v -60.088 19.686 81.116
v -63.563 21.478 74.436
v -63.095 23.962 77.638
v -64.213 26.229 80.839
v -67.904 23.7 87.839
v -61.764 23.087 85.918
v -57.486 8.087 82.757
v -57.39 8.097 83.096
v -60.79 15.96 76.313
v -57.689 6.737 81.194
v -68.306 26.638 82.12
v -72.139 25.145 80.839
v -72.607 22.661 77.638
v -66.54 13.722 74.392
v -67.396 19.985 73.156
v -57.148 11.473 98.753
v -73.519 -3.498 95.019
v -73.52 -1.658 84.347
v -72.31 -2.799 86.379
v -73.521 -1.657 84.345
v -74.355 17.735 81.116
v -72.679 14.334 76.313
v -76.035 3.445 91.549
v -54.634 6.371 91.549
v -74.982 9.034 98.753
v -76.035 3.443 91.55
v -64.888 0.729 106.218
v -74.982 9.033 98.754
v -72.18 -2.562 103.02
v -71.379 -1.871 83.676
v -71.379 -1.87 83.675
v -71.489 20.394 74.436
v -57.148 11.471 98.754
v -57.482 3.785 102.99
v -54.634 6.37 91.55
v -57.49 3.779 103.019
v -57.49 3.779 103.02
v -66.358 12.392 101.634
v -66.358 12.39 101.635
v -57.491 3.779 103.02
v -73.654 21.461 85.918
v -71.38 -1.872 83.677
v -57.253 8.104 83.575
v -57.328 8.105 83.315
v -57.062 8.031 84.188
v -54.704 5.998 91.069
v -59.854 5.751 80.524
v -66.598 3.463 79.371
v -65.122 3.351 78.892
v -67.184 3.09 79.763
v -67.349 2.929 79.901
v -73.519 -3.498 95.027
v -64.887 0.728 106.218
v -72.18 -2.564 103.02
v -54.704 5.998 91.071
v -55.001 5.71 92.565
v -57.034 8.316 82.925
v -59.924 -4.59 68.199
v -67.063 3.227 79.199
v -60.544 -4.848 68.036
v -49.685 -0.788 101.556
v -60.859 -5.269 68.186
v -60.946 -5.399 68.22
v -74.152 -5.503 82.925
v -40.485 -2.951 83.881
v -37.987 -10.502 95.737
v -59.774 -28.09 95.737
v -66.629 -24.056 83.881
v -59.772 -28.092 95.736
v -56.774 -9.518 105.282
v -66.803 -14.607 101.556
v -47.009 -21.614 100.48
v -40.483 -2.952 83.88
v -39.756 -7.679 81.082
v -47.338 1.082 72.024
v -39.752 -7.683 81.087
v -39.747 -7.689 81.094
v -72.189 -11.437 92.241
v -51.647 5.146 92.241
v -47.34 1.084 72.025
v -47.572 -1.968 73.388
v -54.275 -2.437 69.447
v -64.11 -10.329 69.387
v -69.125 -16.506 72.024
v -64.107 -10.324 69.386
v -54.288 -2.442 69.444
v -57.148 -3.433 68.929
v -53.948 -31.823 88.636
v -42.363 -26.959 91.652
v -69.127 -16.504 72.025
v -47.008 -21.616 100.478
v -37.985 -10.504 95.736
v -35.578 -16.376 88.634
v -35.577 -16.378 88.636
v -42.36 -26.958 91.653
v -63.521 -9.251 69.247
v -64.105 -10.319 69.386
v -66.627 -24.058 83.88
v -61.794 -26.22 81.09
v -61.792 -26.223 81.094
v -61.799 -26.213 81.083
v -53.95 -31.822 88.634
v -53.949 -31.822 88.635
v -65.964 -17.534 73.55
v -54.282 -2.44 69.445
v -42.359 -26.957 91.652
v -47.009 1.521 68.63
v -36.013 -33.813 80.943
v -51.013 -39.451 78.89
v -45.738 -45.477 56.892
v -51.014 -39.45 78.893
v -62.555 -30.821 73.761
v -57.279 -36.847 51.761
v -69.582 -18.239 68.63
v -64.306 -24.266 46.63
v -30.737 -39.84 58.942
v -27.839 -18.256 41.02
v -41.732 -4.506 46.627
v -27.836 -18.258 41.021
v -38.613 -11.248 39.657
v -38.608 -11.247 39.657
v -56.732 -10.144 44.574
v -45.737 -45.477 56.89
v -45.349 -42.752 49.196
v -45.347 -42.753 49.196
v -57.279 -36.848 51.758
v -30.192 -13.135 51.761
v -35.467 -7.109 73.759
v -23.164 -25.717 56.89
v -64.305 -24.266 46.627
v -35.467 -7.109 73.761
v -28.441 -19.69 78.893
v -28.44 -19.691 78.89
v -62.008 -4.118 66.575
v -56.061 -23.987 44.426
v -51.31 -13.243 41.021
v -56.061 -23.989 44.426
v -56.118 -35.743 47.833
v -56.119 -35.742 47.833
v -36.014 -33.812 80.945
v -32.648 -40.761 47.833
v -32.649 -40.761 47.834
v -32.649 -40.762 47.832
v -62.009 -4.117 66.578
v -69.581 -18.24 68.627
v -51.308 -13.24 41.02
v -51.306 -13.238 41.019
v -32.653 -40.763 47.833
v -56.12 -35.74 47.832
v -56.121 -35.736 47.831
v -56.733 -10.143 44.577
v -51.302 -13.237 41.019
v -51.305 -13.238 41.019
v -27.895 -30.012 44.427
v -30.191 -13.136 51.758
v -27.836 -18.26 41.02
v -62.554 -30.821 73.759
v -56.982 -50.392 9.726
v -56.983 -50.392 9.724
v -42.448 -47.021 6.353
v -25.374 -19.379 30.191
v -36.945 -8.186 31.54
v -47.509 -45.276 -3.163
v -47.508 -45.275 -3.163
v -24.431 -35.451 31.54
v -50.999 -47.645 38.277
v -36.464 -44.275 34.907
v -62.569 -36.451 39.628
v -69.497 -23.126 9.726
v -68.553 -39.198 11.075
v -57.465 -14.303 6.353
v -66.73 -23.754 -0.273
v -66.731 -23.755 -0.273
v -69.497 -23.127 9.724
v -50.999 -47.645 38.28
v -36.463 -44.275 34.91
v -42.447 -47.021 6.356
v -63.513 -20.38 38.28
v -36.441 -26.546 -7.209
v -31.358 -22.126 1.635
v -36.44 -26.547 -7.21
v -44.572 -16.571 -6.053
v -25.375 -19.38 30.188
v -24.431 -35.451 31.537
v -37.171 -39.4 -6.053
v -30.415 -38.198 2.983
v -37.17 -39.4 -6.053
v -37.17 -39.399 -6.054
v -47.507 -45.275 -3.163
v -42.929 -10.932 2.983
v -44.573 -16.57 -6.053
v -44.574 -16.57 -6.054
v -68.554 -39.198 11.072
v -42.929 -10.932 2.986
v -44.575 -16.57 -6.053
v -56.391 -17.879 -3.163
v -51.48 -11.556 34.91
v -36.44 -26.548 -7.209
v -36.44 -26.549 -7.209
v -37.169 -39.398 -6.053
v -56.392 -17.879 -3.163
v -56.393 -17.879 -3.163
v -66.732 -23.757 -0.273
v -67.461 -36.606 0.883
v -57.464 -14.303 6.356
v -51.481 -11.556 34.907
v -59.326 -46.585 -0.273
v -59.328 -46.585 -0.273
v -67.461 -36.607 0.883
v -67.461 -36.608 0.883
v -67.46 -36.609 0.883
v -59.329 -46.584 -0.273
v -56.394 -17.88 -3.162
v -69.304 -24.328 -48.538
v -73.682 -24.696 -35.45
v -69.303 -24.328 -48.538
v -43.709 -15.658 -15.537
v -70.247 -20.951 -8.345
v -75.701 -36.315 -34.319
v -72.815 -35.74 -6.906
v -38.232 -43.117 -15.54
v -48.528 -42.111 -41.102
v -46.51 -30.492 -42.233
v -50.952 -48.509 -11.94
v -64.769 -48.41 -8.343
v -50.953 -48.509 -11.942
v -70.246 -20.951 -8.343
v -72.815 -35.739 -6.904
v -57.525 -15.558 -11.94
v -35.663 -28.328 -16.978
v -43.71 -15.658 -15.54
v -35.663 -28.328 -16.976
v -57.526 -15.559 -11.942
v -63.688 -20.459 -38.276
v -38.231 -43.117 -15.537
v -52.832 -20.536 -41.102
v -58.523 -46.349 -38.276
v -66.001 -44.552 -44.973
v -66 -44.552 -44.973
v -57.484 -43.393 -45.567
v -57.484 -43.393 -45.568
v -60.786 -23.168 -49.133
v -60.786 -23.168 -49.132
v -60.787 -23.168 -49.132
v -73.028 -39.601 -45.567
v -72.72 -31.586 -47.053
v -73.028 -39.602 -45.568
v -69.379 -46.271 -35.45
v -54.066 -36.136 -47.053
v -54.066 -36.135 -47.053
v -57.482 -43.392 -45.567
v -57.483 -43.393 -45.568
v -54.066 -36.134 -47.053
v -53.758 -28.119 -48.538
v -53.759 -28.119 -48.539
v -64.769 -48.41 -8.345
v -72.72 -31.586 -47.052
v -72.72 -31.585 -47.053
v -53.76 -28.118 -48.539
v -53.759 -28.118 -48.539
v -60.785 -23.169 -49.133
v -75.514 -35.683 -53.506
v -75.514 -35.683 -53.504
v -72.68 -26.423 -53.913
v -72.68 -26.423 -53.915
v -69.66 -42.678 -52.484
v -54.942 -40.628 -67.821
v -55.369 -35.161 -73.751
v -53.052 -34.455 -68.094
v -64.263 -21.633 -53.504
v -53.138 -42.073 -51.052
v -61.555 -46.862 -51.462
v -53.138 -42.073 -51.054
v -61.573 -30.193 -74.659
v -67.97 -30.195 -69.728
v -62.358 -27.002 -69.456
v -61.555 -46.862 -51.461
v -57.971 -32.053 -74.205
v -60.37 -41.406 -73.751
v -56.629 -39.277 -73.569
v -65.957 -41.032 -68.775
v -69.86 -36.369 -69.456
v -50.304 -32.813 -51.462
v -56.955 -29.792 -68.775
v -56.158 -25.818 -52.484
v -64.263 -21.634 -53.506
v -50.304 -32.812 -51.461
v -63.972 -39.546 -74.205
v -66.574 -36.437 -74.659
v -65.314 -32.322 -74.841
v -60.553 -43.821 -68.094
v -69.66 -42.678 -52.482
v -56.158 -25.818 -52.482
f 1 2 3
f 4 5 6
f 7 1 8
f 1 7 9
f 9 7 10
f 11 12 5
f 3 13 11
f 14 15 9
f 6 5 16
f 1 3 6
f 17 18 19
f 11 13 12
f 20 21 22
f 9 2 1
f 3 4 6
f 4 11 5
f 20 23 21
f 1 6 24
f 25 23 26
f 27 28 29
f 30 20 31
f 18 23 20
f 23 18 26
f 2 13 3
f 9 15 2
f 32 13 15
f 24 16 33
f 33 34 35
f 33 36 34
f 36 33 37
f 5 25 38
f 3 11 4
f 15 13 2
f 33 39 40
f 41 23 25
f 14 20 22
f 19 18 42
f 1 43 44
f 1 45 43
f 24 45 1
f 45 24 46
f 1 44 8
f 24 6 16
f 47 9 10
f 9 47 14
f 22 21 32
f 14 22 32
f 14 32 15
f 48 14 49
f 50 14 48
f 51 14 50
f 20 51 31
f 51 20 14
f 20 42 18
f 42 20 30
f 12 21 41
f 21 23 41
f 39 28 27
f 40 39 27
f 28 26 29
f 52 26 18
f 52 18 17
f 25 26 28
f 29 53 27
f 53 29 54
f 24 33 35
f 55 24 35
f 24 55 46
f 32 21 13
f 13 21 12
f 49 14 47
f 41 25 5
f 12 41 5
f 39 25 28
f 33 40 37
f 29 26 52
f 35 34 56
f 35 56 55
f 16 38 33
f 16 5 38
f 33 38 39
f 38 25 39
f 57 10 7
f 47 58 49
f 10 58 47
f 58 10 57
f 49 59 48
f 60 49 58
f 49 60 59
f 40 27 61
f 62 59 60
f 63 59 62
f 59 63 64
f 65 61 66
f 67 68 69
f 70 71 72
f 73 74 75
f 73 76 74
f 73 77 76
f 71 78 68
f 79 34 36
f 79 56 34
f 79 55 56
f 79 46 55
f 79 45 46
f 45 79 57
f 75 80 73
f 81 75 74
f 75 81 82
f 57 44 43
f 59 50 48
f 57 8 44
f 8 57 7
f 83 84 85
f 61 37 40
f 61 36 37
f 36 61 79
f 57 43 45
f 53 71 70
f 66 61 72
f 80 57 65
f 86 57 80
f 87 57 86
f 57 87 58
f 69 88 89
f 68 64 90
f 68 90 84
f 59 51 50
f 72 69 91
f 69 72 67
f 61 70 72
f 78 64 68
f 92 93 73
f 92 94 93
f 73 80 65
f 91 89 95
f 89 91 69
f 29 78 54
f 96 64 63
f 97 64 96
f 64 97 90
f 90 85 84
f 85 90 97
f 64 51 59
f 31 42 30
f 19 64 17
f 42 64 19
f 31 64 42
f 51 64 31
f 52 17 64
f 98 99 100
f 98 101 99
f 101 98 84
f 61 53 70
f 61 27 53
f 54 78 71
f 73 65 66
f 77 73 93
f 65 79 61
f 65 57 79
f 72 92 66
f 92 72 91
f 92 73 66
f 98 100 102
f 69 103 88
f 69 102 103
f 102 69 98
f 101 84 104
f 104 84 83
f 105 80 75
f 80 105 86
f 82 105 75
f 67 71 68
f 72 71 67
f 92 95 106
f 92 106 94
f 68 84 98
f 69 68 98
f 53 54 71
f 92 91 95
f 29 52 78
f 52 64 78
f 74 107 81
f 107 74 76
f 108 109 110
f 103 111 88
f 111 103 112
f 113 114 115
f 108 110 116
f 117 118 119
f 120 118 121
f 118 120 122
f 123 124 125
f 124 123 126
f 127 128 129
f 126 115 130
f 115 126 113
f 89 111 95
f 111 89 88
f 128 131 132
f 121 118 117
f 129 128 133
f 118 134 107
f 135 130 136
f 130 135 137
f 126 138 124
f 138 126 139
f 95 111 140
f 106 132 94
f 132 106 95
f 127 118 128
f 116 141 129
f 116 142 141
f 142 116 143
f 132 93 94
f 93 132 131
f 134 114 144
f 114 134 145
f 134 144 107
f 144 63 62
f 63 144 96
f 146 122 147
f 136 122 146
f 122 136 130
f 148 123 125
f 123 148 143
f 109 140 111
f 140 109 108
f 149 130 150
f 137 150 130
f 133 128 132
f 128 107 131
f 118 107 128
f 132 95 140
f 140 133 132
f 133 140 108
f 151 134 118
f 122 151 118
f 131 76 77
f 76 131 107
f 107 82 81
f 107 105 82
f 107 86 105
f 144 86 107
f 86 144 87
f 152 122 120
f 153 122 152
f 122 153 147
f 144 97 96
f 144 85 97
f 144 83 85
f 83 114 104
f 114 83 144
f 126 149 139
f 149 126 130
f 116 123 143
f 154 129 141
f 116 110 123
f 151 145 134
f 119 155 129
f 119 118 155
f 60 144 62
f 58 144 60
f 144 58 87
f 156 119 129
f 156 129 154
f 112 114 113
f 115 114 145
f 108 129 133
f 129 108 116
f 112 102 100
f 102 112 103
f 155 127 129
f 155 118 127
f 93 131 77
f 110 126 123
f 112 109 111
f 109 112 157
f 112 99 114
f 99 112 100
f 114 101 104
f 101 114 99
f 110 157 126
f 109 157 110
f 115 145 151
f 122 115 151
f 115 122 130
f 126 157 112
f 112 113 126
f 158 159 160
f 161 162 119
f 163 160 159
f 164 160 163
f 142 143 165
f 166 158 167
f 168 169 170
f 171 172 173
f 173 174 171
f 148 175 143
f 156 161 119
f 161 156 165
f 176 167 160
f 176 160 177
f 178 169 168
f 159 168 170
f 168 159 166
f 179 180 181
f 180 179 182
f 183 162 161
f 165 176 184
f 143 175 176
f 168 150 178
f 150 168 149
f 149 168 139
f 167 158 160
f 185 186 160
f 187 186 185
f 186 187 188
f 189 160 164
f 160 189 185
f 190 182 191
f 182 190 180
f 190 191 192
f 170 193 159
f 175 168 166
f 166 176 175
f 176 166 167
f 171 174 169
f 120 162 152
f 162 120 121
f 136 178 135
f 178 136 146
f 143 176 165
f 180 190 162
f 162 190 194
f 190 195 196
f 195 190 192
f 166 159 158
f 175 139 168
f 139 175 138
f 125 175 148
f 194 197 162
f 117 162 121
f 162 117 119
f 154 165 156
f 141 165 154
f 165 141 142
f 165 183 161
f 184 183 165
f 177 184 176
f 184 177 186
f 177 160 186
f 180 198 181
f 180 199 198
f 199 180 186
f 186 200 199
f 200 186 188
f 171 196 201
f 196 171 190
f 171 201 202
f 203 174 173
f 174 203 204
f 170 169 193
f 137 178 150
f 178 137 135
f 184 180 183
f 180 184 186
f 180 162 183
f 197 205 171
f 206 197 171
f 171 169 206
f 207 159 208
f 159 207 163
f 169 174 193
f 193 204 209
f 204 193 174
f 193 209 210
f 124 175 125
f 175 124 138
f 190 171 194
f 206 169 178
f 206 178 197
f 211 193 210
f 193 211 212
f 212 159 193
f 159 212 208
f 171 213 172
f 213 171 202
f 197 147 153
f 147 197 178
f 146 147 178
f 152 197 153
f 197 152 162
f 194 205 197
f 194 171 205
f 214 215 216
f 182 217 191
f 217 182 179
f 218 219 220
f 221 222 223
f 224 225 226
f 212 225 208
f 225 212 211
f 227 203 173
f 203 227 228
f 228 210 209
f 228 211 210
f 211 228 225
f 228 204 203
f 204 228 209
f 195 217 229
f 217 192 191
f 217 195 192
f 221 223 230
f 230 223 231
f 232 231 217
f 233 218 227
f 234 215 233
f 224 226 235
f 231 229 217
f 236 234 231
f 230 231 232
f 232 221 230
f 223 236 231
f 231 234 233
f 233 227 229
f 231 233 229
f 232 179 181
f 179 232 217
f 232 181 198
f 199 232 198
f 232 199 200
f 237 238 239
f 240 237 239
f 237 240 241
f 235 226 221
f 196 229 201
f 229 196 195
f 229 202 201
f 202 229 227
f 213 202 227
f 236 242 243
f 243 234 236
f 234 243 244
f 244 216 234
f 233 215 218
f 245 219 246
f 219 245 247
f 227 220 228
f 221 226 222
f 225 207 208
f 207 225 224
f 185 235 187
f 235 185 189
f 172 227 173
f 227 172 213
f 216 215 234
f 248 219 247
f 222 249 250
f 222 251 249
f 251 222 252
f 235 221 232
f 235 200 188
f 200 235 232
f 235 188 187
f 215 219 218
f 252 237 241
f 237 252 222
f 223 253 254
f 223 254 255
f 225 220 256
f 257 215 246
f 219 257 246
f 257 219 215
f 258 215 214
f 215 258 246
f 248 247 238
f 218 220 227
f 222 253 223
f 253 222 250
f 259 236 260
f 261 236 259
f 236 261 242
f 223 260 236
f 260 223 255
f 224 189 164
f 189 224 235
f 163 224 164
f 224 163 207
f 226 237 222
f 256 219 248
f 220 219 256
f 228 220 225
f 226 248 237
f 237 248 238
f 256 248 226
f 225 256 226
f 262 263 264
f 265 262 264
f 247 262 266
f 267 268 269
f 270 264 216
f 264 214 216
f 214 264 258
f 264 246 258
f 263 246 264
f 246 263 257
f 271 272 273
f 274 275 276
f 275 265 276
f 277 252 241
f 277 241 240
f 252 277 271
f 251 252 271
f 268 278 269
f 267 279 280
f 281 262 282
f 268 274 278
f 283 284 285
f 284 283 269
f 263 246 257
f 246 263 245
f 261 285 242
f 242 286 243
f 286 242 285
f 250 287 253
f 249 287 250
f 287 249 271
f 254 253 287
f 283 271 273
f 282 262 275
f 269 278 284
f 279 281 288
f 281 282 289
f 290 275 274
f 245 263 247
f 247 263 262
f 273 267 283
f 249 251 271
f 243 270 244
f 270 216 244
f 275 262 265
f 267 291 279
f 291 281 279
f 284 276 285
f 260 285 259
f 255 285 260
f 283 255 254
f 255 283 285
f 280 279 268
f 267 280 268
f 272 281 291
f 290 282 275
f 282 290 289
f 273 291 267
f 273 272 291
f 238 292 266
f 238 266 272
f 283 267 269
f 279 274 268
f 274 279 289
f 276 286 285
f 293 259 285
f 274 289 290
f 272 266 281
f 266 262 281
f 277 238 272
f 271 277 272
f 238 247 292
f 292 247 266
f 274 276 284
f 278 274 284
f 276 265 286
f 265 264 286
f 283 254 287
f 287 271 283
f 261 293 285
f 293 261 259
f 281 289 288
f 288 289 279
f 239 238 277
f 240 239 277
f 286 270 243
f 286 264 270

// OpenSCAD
V3d = [
  [-67.8509, 23.3115, 77.6378,1],
  [-64.7054, 0.307143, 95.027,2],
  [-50.7696, -16.9558, 81.0949,3],
  [-41.9771, -26.9999, 44.4277,3],
  [-51.9501, -31.5773, -3.16171,3],
  [-63.3934, -33.86, -47.0519,2],
  [-60.9717, -35.7994, -74.2041,1],
];


profile = [
  [5, 5],
  [0,6],
[-5, 5],
[-7,0],
[-5, -5],
[0,-6],
[5, -5],
[7,0]

];

bodypart(profile, V3d );
module bodypart(profile, List, grove=0.8,lrp1=0.2,lrp2=0.8) {
    lrp0=0;
    lrp3=1;
   sth = 0.001;
  for(i = [0: len(List) - 2]) {
    hull() {
      if(i == 0) {
          
color("red")
ttranslate(List[i]) rotate(getangle(v(i,List)))  scale(lerp(List[i][3],List[i+1][3],lrp0)) scale(grove)  linear_extrude(height = sth) polygon(profile);
ttranslate(lerp(List[i ],List[i + 1],lrp1)) rotate(getangle(v(i,List) ) )    scale(lerp(List[i][3],List[i+1][3],lrp1)) linear_extrude(height = sth) polygon(profile);
ttranslate(lerp(List[i ],List[i + 1],lrp2)) rotate(getangle(v(i,List) ) )    scale(lerp(List[i][3],List[i+1][3],lrp2)) linear_extrude(height = sth) polygon(profile);

color("green")
ttranslate(List[i + 1]) rotate((getangle(v(i,List)) + getangle(v(i+1,List))) / 2) scale(lerp(List[i][3],List[i+1][3],lrp3))  scale(grove)  linear_extrude(height = sth) polygon(profile);
      
} else if(i == len(List) - 2) {

color("red")
ttranslate(List[i ])  rotate((getangle(v(i-1,List)) + getangle(v(i,List))) / 2)   scale(lerp(List[i][3],List[i+1][3],lrp0)) scale(grove)  linear_extrude(height = sth) polygon(profile);


ttranslate(lerp(List[i ],List[i + 1],lrp1)) rotate(getangle(v(i,List) ) )    scale(lerp(List[i][3],List[i+1][3],lrp1)) linear_extrude(height = sth) polygon(profile);
ttranslate(lerp(List[i ],List[i + 1],lrp2)) rotate(getangle(v(i,List) ) )    scale(lerp(List[i][3],List[i+1][3],lrp2)) linear_extrude(height = sth) polygon(profile);

color("green")
ttranslate(List[i+1]) rotate(getangle(v(i,List))) scale(lerp(List[i][3],List[i+1][3],lrp3))  scale(grove)  linear_extrude(height = sth) polygon(profile);

      } 
 else {
echo(getangle(v(i,List)));
color("red")
ttranslate(List[i ])  rotate((getangle(v(i-1,List)) + getangle(v(i,List))) / 2)   scale(lerp(List[i][3],List[i+1][3],lrp0)) scale(grove)  linear_extrude(height = sth) polygon(profile);


ttranslate(lerp(List[i ],List[i + 1],lrp1)) rotate(getangle(v(i,List) ) )    scale(lerp(List[i][3],List[i+1][3],lrp1)) linear_extrude(height = sth) polygon(profile);
ttranslate(lerp(List[i ],List[i + 1],lrp2)) rotate(getangle(v(i,List) ) )    scale(lerp(List[i][3],List[i+1][3],lrp2))  linear_extrude(height = sth) polygon(profile);

color("green")
ttranslate(List[i + 1]) rotate((getangle(v(i,List)) + getangle(v(i+1,List))) / 2)scale(lerp(List[i][3],List[i+1][3],lrp3))   scale(grove)  linear_extrude(height = sth) polygon(profile);
 
     }
    }
  }
}
module ttranslate(v){
          for (j=[0:$children-1]) 
      translate(t(v))  children(j);
    }
    
function getangle(v) = (len(v) == 3||len(v) == 4) ? [0, 90, 0] + geteuler(lim3(1, v)): [90, 0, 0] + [0, 0, -atan2(v[0], v[1])];
function lerp(start,end,bias ) = (end * bias + start * (1 - bias));
function geteuler(v) = [0, -asin(v[2]), atan2(v2xy(v)[1], v2xy(v)[0])]; //Euler angles from Vec3
function v2xy(v) = lim3(1, [v[0], v[1], 0]); // down projection xyz2xy
function lim3(l, v) = v / len3(v) * l; // normalize Vec37Vec4 to magnitude l
function len3(v) = sqrt(pow(v[0], 2) + pow(v[1], 2) + pow(v[2], 2)); // find magnitude of Vec3
function v(i,v)=v[i+1]-v[i]; // vec3 from polyline segment
function t(v) = [v[0], v[1], v[2]];// purge vec4... down to vec3 (for translate to play nice)
